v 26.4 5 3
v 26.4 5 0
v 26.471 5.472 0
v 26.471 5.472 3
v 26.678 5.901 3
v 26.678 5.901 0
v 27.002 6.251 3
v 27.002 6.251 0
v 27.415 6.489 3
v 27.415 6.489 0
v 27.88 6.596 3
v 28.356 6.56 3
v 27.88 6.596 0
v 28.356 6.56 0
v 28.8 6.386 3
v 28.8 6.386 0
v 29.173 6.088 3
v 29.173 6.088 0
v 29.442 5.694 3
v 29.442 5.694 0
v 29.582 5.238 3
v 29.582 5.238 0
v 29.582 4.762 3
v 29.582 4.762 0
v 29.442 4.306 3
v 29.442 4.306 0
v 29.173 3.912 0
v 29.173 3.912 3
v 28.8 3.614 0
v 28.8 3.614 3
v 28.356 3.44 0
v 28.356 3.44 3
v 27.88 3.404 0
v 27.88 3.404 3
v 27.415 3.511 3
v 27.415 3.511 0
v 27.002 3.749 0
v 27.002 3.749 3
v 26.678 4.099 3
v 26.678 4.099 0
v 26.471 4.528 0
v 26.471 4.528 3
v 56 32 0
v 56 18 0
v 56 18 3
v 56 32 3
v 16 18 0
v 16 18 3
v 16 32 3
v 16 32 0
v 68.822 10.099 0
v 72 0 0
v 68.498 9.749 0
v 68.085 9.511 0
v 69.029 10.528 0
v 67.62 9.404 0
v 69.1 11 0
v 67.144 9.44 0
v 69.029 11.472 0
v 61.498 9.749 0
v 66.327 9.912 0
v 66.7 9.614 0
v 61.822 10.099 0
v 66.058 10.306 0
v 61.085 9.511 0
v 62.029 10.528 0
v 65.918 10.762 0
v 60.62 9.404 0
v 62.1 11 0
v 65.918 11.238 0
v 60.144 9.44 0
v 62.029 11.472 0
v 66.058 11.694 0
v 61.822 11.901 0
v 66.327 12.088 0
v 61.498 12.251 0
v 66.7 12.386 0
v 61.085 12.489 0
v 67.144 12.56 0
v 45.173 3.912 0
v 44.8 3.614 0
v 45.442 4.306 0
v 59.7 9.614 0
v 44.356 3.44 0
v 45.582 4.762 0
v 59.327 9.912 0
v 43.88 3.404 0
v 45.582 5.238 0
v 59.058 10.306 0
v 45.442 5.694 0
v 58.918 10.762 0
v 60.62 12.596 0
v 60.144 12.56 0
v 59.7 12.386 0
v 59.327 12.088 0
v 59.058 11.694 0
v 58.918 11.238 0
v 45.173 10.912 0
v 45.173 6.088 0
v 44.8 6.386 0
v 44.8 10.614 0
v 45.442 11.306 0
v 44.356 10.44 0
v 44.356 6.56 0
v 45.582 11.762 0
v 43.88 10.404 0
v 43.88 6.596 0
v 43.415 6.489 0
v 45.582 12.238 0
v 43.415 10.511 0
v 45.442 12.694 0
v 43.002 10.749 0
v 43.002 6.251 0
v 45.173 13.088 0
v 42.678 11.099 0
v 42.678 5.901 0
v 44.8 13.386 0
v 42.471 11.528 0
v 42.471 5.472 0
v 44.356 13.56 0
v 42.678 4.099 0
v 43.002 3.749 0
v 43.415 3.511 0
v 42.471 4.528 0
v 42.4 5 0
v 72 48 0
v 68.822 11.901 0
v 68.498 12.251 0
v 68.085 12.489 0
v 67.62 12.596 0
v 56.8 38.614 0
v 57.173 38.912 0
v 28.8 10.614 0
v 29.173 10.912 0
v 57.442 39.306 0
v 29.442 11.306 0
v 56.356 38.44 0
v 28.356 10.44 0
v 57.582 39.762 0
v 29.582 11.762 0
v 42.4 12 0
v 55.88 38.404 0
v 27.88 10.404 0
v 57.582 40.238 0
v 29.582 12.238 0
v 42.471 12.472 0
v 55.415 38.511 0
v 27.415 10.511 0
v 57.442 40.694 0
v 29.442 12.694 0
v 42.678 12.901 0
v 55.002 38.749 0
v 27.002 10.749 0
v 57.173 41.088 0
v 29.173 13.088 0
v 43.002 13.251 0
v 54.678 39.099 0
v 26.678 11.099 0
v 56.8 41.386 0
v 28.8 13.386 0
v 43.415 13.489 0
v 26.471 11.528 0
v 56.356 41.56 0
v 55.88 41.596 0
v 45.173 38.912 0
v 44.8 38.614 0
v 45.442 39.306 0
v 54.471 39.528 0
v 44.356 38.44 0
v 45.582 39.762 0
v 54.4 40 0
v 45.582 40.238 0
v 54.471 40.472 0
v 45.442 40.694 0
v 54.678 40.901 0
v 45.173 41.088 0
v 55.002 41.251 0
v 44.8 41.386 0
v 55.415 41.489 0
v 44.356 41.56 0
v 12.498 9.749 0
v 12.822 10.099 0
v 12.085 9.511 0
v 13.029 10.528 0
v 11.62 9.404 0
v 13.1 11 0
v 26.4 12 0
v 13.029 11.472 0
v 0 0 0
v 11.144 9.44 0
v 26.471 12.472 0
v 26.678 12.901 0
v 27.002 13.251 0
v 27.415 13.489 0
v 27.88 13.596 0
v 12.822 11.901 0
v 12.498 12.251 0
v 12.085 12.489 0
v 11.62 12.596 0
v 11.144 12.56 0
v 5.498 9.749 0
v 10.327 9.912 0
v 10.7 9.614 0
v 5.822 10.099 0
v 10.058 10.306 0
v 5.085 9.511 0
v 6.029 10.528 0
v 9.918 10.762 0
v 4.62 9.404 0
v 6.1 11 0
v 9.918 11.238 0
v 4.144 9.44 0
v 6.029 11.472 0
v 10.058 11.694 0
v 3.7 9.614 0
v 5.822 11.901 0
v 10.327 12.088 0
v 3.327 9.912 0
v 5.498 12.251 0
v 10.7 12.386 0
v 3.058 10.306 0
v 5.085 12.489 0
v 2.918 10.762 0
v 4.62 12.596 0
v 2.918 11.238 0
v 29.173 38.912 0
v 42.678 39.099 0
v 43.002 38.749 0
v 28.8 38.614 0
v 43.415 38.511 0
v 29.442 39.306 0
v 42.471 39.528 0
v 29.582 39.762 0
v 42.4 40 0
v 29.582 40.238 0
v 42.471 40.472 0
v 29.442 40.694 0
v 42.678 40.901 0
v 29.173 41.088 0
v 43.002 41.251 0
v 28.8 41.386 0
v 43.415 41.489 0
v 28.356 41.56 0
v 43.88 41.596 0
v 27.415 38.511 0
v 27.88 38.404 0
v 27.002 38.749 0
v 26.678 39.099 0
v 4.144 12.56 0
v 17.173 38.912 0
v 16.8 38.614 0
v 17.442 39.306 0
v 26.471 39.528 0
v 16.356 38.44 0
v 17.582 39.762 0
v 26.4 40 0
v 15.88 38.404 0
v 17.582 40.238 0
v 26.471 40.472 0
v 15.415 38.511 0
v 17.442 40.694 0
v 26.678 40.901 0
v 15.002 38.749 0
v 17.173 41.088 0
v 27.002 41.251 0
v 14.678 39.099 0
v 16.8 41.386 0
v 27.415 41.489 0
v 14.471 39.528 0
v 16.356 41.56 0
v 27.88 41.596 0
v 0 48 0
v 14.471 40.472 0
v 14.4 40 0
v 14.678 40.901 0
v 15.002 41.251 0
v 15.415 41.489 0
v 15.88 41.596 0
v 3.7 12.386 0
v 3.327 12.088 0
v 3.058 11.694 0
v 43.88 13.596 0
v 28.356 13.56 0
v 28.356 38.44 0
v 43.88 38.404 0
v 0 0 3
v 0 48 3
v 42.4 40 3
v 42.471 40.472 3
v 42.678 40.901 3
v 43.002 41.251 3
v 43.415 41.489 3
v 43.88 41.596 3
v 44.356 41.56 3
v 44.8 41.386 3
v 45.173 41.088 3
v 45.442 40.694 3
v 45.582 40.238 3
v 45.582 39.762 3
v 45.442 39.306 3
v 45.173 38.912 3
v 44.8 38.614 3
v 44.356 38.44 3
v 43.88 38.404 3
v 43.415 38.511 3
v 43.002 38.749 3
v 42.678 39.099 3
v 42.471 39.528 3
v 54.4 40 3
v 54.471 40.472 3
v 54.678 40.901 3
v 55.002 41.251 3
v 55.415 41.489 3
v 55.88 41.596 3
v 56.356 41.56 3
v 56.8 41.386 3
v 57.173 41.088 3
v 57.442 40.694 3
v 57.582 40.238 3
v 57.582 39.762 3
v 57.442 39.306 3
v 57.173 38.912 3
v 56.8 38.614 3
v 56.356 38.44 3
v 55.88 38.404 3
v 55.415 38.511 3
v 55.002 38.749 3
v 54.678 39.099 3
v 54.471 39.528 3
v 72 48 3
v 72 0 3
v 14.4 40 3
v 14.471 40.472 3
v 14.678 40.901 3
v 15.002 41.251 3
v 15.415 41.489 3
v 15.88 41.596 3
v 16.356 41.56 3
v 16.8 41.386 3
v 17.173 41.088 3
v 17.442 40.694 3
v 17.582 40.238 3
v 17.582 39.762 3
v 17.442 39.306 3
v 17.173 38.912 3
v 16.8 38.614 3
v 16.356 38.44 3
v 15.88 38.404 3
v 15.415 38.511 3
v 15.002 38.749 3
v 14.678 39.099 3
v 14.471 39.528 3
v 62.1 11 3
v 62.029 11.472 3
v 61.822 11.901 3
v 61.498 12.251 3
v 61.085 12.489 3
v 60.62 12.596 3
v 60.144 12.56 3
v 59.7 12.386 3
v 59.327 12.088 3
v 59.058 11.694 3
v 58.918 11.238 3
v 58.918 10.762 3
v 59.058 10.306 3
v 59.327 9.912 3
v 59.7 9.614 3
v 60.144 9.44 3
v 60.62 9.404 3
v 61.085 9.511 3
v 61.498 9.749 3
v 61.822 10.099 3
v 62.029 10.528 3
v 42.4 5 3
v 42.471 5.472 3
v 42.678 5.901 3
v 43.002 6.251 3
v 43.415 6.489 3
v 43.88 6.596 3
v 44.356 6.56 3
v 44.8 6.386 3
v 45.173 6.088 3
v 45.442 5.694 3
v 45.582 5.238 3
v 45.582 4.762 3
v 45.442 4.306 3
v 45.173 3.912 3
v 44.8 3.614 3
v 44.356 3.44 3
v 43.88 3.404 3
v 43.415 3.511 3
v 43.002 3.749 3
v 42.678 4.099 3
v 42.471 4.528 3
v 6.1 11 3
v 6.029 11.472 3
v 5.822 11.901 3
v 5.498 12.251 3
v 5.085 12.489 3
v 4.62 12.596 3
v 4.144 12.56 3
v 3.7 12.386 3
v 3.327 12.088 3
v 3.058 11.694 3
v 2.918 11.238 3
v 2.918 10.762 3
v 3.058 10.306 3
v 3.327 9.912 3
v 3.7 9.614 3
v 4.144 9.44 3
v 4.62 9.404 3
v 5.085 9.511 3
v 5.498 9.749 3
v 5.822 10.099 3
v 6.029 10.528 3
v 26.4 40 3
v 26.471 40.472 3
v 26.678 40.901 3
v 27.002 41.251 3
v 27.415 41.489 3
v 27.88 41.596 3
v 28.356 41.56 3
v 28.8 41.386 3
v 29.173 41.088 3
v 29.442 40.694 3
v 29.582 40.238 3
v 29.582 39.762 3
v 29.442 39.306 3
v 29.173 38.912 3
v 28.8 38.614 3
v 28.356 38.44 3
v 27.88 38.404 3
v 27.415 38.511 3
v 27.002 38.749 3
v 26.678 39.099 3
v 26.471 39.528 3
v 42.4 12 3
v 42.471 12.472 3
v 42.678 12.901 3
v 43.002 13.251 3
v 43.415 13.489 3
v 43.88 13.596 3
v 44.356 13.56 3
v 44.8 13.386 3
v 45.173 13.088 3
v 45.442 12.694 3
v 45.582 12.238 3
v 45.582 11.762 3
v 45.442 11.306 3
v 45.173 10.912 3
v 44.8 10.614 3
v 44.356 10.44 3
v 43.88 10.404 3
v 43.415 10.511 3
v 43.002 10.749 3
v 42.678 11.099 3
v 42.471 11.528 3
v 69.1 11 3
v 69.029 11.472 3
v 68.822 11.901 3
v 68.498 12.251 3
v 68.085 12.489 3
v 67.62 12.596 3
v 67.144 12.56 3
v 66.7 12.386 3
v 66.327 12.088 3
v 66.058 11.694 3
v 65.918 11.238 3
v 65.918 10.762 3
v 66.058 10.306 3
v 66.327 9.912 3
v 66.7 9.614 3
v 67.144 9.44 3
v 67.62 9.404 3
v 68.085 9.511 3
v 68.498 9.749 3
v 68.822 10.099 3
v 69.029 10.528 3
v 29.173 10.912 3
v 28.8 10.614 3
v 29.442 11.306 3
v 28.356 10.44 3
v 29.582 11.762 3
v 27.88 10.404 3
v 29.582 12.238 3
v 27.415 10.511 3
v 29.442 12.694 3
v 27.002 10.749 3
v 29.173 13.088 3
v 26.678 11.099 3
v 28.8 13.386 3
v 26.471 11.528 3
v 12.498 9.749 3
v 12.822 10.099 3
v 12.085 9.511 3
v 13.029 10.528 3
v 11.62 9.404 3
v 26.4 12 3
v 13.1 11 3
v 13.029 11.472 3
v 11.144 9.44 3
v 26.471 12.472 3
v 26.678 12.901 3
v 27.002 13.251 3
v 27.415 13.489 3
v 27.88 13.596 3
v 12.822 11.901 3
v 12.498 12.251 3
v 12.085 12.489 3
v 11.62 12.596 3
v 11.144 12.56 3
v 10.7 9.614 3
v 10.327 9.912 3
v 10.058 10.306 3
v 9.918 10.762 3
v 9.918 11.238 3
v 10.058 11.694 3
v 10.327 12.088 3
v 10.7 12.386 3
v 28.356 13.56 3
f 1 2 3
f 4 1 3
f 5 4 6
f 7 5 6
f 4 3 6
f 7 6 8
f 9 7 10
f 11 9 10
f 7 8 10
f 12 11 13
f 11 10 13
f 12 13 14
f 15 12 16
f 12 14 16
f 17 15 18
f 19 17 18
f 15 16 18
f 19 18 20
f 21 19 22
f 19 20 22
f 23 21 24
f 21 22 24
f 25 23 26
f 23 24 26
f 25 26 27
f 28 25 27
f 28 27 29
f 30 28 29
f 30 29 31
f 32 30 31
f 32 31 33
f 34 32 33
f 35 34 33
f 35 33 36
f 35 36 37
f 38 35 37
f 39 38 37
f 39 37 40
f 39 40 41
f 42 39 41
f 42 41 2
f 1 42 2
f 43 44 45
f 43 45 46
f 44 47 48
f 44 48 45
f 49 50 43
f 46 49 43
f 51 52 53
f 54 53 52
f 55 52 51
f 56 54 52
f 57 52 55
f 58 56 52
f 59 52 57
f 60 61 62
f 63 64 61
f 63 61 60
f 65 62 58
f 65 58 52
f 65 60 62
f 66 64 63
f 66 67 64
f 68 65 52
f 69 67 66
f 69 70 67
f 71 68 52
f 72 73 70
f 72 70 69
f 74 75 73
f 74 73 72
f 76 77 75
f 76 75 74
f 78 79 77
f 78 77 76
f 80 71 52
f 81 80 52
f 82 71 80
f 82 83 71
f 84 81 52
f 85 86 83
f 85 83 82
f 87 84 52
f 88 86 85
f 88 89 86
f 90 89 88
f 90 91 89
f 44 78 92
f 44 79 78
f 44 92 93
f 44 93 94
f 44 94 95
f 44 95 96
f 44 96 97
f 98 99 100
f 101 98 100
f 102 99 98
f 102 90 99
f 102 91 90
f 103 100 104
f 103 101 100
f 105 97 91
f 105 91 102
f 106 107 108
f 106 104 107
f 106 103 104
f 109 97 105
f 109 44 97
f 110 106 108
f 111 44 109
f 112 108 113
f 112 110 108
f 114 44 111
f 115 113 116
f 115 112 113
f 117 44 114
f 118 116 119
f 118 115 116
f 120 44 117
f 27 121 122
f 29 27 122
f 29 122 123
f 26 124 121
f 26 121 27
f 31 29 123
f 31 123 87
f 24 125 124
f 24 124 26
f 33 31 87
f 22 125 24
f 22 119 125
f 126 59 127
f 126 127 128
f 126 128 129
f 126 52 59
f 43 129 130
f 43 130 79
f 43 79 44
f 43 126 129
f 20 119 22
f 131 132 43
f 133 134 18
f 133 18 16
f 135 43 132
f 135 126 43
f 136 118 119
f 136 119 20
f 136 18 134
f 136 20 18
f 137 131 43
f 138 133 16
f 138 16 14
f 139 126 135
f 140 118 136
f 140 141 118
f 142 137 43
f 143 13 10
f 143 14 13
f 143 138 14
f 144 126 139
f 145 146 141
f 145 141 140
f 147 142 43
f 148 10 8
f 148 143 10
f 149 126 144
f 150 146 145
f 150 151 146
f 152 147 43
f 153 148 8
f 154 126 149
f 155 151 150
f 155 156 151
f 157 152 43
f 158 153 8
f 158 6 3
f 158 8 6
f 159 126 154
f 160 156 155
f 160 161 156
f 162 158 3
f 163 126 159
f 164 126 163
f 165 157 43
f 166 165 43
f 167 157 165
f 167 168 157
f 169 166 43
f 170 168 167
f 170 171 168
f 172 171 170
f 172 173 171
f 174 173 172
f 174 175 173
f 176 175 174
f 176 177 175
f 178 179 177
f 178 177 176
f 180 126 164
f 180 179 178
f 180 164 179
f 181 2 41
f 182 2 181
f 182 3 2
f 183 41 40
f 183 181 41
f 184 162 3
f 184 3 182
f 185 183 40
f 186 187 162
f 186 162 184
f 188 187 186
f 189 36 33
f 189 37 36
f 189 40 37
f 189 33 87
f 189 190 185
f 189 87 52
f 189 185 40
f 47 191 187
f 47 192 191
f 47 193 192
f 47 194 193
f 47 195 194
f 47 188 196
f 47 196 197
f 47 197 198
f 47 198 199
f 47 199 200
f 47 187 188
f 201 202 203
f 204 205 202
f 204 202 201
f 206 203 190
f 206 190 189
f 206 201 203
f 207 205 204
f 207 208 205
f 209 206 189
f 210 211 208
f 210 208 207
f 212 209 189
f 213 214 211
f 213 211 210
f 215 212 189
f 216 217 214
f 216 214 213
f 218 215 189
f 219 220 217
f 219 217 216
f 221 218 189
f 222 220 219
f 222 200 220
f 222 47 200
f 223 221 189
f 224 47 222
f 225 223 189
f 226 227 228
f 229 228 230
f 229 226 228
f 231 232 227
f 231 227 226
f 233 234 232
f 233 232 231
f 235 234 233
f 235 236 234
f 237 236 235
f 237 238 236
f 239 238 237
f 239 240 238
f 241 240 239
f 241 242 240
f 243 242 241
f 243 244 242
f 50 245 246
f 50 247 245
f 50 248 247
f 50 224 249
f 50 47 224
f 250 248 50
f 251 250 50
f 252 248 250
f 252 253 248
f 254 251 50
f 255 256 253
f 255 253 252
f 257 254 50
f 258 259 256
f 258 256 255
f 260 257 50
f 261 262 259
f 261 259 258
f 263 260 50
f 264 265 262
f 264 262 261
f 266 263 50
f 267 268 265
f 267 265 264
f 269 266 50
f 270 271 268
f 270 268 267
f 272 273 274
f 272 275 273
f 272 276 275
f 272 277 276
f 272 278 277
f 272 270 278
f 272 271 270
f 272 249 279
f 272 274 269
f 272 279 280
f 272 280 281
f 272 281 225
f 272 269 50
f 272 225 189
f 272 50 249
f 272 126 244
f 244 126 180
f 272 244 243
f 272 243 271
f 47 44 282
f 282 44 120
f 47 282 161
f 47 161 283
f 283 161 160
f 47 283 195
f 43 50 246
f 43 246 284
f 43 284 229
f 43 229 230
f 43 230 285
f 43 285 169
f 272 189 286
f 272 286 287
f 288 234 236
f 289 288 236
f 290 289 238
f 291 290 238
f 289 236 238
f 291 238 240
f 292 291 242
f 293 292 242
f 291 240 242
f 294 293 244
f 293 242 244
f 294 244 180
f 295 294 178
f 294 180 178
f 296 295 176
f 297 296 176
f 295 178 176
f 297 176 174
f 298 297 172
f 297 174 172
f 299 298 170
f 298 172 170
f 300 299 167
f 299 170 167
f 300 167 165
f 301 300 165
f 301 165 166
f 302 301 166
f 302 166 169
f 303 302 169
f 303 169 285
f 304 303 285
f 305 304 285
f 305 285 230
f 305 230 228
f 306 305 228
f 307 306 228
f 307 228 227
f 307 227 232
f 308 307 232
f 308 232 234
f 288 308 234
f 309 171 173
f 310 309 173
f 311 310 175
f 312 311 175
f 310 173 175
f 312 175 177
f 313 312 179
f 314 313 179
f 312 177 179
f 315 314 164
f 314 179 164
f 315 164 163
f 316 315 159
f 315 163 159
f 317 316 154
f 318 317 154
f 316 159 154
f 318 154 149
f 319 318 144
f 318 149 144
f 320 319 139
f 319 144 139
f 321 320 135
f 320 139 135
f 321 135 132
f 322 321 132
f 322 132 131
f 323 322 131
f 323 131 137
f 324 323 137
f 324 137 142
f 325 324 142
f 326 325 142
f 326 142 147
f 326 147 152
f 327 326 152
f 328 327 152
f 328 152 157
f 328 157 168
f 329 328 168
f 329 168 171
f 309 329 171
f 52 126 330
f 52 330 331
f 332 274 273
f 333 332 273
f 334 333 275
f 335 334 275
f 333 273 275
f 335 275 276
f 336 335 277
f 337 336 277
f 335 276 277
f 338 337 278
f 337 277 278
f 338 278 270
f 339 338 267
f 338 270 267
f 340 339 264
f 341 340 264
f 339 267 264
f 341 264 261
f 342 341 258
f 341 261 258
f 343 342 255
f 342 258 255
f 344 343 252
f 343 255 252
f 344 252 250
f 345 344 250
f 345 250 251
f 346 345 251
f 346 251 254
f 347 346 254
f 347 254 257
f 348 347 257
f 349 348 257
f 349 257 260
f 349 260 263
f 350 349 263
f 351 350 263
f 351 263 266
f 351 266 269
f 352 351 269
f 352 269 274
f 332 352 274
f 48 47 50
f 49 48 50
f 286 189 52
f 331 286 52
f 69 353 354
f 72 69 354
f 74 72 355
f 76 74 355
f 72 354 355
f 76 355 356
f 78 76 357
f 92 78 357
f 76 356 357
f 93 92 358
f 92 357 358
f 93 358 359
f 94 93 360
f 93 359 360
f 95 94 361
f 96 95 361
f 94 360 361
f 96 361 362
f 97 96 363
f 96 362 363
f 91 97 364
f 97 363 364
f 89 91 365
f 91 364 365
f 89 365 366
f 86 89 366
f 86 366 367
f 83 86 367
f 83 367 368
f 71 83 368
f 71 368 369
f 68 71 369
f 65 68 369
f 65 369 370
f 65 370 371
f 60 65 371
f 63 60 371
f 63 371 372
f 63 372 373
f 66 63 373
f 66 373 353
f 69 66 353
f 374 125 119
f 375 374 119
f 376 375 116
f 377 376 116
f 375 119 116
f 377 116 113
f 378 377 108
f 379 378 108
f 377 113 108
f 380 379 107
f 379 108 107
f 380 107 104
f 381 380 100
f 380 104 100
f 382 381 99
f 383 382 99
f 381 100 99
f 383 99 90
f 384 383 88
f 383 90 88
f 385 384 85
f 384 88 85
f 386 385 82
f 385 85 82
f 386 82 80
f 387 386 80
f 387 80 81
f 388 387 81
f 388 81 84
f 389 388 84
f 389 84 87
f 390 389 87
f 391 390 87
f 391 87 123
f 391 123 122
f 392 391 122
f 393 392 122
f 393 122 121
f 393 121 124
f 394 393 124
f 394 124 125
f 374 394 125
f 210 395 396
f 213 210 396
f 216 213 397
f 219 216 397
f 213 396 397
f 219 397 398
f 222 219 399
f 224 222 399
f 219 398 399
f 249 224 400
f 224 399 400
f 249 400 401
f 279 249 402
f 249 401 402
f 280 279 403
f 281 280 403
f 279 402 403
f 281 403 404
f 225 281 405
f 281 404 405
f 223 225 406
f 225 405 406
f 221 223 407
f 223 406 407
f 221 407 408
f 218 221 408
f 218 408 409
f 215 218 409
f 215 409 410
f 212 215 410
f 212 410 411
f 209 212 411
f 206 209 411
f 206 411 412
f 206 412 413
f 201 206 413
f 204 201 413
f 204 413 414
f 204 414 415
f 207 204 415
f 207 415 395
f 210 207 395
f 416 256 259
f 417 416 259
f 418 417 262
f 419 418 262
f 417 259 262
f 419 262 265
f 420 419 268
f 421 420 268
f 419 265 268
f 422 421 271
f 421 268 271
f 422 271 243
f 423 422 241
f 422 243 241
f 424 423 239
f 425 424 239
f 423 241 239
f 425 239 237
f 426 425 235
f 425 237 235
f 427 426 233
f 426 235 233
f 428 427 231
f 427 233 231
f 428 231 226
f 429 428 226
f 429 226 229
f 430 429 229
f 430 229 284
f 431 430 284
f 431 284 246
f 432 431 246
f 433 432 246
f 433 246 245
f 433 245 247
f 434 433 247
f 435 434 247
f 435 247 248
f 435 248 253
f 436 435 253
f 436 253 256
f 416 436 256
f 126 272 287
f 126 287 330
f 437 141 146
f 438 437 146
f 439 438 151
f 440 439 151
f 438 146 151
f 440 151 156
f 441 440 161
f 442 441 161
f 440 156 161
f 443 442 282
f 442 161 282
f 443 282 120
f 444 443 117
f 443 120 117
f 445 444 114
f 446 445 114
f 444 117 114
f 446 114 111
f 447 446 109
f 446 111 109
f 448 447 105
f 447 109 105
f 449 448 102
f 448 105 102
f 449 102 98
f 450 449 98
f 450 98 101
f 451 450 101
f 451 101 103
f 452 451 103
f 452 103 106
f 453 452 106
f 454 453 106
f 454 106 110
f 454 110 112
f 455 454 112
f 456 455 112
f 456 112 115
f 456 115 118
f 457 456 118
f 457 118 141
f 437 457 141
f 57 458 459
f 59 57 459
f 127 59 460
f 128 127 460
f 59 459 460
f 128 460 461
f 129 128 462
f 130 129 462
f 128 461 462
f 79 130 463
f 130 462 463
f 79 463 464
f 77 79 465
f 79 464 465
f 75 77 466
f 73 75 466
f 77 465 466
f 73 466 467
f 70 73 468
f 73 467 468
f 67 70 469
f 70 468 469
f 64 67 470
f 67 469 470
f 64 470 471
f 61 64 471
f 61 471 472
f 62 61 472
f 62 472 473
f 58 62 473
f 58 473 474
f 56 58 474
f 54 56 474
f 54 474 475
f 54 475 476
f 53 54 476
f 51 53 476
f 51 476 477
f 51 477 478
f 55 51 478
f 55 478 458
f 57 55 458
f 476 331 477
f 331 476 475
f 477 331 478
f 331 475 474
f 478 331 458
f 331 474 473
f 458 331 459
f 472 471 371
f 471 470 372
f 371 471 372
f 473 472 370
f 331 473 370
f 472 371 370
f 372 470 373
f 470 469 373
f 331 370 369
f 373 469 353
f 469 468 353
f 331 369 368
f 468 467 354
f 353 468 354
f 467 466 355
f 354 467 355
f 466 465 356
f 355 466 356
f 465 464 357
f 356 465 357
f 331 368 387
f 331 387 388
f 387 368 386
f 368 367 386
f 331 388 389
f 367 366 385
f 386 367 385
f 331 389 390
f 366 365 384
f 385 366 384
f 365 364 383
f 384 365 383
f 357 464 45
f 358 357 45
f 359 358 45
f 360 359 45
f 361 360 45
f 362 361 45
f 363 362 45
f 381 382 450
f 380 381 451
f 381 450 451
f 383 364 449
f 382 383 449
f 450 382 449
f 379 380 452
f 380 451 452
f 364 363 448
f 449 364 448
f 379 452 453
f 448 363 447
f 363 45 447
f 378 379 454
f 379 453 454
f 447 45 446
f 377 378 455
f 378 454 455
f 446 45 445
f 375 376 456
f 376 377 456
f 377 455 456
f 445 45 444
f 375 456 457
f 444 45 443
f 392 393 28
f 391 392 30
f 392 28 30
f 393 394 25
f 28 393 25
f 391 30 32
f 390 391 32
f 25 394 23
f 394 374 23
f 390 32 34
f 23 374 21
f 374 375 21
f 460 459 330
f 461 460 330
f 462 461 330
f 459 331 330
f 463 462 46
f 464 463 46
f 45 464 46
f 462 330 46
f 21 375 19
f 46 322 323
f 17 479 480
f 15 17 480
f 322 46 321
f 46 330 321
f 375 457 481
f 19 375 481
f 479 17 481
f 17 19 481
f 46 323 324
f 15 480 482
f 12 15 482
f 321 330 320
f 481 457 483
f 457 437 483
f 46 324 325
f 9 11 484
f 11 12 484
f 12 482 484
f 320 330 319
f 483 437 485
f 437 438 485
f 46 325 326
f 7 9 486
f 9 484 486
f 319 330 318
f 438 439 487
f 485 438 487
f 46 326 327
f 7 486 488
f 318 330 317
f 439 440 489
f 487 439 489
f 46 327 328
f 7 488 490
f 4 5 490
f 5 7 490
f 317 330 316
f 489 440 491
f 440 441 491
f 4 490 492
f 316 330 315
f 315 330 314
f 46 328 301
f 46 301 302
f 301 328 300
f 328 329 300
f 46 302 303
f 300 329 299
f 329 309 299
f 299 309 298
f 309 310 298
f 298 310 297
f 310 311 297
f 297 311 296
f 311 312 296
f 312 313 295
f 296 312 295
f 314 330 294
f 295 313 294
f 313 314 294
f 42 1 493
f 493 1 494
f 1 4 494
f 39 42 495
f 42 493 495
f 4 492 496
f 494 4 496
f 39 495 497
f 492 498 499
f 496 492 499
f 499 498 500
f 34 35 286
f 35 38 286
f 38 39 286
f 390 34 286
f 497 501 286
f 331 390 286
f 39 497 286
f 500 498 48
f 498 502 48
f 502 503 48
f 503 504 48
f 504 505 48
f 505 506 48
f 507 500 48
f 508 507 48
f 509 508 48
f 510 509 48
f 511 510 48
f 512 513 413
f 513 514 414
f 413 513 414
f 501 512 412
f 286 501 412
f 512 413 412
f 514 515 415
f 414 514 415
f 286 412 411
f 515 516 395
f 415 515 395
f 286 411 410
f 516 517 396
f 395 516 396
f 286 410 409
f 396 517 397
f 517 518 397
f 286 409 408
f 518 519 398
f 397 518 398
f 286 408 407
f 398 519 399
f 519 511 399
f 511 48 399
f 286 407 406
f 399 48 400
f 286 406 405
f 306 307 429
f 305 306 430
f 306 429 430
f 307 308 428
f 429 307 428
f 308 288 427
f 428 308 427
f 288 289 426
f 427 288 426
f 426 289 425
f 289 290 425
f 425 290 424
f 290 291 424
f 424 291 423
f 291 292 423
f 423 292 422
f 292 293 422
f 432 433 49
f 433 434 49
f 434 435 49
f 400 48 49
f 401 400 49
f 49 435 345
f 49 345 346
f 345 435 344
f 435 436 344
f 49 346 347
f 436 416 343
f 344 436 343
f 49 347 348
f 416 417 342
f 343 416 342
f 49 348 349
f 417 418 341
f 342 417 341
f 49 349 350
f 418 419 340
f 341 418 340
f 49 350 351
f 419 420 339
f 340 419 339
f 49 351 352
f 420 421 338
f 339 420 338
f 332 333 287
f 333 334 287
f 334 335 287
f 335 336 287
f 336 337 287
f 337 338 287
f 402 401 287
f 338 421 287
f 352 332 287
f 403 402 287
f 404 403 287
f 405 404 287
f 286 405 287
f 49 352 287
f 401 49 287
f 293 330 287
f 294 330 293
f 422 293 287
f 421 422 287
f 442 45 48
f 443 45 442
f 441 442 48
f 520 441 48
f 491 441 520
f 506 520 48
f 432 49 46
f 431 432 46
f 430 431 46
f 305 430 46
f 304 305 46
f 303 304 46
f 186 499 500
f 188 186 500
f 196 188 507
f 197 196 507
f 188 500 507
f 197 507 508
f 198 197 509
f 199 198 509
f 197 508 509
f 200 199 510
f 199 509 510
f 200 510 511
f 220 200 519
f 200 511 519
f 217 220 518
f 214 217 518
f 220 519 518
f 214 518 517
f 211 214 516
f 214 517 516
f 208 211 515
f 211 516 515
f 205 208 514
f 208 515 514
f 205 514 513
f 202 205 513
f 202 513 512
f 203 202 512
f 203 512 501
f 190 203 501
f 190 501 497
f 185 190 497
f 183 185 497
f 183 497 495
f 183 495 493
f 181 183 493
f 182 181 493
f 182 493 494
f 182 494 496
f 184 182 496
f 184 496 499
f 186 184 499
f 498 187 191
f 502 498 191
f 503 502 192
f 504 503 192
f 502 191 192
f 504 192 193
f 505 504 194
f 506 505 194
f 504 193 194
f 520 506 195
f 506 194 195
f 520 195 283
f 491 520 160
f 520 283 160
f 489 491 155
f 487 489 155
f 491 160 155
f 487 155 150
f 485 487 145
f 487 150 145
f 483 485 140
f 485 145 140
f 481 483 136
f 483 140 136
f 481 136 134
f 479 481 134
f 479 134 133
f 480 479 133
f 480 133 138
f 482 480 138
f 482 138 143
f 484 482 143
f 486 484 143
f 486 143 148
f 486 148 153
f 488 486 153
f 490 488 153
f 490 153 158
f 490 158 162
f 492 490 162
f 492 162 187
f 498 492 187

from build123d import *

# Parameters (mm, degrees)
SKETCH_1_W          = 40
SKETCH_1_H          = 14
EXTRUDE_2_DEPTH     = 3
SKETCH_2_R          = 1.6
CUT_EXTRUDE_1_DEPTH = 10
SKETCH_3_R          = 1.6
CUT_EXTRUDE_2_DEPTH = 87.585218138


with BuildPart() as part:
    # 草图1 → 凸台-拉伸2 (new body)
    with BuildSketch(Plane.XY):
        Polygon((0, 0), (0, 48), (72, 48), (72, 0), (56, 0), (16, 0), align=None)
        with Locations((36, 25)):
            Rectangle(SKETCH_1_W, SKETCH_1_H, mode=Mode.SUBTRACT)
    extrude(amount=EXTRUDE_2_DEPTH)

    # 草图2 → 切除-拉伸1 (cut)
    with BuildSketch(Plane(origin=(0, 0, 0), x_dir=(-1, 0, 0), z_dir=(0, 0, -1))):
        with Locations((-44, 12)):
            Circle(SKETCH_2_R)
        with Locations((-28, 12)):
            Circle(SKETCH_2_R)
        with Locations((-44, 40)):
            Circle(SKETCH_2_R)
        with Locations((-28, 40)):
            Circle(SKETCH_2_R)
        with Locations((-56, 40)):
            Circle(SKETCH_2_R)
        with Locations((-16, 40)):
            Circle(SKETCH_2_R)
        with Locations((-44, 5)):
            Circle(SKETCH_2_R)
        with Locations((-28, 5)):
            Circle(SKETCH_2_R)
    extrude(amount=-CUT_EXTRUDE_1_DEPTH, mode=Mode.SUBTRACT)

    # 草图3 → 切除-拉伸2 (cut, through all)
    with BuildSketch(Plane.XY.offset(3)):
        with Locations((67.5, 11)):
            Circle(SKETCH_3_R)
        with Locations((60.5, 11)):
            Circle(SKETCH_3_R)
        with Locations((4.5, 11)):
            Circle(SKETCH_3_R)
        with Locations((11.5, 11)):
            Circle(SKETCH_3_R)
    extrude(amount=-CUT_EXTRUDE_2_DEPTH, mode=Mode.SUBTRACT)


solid = part.part
